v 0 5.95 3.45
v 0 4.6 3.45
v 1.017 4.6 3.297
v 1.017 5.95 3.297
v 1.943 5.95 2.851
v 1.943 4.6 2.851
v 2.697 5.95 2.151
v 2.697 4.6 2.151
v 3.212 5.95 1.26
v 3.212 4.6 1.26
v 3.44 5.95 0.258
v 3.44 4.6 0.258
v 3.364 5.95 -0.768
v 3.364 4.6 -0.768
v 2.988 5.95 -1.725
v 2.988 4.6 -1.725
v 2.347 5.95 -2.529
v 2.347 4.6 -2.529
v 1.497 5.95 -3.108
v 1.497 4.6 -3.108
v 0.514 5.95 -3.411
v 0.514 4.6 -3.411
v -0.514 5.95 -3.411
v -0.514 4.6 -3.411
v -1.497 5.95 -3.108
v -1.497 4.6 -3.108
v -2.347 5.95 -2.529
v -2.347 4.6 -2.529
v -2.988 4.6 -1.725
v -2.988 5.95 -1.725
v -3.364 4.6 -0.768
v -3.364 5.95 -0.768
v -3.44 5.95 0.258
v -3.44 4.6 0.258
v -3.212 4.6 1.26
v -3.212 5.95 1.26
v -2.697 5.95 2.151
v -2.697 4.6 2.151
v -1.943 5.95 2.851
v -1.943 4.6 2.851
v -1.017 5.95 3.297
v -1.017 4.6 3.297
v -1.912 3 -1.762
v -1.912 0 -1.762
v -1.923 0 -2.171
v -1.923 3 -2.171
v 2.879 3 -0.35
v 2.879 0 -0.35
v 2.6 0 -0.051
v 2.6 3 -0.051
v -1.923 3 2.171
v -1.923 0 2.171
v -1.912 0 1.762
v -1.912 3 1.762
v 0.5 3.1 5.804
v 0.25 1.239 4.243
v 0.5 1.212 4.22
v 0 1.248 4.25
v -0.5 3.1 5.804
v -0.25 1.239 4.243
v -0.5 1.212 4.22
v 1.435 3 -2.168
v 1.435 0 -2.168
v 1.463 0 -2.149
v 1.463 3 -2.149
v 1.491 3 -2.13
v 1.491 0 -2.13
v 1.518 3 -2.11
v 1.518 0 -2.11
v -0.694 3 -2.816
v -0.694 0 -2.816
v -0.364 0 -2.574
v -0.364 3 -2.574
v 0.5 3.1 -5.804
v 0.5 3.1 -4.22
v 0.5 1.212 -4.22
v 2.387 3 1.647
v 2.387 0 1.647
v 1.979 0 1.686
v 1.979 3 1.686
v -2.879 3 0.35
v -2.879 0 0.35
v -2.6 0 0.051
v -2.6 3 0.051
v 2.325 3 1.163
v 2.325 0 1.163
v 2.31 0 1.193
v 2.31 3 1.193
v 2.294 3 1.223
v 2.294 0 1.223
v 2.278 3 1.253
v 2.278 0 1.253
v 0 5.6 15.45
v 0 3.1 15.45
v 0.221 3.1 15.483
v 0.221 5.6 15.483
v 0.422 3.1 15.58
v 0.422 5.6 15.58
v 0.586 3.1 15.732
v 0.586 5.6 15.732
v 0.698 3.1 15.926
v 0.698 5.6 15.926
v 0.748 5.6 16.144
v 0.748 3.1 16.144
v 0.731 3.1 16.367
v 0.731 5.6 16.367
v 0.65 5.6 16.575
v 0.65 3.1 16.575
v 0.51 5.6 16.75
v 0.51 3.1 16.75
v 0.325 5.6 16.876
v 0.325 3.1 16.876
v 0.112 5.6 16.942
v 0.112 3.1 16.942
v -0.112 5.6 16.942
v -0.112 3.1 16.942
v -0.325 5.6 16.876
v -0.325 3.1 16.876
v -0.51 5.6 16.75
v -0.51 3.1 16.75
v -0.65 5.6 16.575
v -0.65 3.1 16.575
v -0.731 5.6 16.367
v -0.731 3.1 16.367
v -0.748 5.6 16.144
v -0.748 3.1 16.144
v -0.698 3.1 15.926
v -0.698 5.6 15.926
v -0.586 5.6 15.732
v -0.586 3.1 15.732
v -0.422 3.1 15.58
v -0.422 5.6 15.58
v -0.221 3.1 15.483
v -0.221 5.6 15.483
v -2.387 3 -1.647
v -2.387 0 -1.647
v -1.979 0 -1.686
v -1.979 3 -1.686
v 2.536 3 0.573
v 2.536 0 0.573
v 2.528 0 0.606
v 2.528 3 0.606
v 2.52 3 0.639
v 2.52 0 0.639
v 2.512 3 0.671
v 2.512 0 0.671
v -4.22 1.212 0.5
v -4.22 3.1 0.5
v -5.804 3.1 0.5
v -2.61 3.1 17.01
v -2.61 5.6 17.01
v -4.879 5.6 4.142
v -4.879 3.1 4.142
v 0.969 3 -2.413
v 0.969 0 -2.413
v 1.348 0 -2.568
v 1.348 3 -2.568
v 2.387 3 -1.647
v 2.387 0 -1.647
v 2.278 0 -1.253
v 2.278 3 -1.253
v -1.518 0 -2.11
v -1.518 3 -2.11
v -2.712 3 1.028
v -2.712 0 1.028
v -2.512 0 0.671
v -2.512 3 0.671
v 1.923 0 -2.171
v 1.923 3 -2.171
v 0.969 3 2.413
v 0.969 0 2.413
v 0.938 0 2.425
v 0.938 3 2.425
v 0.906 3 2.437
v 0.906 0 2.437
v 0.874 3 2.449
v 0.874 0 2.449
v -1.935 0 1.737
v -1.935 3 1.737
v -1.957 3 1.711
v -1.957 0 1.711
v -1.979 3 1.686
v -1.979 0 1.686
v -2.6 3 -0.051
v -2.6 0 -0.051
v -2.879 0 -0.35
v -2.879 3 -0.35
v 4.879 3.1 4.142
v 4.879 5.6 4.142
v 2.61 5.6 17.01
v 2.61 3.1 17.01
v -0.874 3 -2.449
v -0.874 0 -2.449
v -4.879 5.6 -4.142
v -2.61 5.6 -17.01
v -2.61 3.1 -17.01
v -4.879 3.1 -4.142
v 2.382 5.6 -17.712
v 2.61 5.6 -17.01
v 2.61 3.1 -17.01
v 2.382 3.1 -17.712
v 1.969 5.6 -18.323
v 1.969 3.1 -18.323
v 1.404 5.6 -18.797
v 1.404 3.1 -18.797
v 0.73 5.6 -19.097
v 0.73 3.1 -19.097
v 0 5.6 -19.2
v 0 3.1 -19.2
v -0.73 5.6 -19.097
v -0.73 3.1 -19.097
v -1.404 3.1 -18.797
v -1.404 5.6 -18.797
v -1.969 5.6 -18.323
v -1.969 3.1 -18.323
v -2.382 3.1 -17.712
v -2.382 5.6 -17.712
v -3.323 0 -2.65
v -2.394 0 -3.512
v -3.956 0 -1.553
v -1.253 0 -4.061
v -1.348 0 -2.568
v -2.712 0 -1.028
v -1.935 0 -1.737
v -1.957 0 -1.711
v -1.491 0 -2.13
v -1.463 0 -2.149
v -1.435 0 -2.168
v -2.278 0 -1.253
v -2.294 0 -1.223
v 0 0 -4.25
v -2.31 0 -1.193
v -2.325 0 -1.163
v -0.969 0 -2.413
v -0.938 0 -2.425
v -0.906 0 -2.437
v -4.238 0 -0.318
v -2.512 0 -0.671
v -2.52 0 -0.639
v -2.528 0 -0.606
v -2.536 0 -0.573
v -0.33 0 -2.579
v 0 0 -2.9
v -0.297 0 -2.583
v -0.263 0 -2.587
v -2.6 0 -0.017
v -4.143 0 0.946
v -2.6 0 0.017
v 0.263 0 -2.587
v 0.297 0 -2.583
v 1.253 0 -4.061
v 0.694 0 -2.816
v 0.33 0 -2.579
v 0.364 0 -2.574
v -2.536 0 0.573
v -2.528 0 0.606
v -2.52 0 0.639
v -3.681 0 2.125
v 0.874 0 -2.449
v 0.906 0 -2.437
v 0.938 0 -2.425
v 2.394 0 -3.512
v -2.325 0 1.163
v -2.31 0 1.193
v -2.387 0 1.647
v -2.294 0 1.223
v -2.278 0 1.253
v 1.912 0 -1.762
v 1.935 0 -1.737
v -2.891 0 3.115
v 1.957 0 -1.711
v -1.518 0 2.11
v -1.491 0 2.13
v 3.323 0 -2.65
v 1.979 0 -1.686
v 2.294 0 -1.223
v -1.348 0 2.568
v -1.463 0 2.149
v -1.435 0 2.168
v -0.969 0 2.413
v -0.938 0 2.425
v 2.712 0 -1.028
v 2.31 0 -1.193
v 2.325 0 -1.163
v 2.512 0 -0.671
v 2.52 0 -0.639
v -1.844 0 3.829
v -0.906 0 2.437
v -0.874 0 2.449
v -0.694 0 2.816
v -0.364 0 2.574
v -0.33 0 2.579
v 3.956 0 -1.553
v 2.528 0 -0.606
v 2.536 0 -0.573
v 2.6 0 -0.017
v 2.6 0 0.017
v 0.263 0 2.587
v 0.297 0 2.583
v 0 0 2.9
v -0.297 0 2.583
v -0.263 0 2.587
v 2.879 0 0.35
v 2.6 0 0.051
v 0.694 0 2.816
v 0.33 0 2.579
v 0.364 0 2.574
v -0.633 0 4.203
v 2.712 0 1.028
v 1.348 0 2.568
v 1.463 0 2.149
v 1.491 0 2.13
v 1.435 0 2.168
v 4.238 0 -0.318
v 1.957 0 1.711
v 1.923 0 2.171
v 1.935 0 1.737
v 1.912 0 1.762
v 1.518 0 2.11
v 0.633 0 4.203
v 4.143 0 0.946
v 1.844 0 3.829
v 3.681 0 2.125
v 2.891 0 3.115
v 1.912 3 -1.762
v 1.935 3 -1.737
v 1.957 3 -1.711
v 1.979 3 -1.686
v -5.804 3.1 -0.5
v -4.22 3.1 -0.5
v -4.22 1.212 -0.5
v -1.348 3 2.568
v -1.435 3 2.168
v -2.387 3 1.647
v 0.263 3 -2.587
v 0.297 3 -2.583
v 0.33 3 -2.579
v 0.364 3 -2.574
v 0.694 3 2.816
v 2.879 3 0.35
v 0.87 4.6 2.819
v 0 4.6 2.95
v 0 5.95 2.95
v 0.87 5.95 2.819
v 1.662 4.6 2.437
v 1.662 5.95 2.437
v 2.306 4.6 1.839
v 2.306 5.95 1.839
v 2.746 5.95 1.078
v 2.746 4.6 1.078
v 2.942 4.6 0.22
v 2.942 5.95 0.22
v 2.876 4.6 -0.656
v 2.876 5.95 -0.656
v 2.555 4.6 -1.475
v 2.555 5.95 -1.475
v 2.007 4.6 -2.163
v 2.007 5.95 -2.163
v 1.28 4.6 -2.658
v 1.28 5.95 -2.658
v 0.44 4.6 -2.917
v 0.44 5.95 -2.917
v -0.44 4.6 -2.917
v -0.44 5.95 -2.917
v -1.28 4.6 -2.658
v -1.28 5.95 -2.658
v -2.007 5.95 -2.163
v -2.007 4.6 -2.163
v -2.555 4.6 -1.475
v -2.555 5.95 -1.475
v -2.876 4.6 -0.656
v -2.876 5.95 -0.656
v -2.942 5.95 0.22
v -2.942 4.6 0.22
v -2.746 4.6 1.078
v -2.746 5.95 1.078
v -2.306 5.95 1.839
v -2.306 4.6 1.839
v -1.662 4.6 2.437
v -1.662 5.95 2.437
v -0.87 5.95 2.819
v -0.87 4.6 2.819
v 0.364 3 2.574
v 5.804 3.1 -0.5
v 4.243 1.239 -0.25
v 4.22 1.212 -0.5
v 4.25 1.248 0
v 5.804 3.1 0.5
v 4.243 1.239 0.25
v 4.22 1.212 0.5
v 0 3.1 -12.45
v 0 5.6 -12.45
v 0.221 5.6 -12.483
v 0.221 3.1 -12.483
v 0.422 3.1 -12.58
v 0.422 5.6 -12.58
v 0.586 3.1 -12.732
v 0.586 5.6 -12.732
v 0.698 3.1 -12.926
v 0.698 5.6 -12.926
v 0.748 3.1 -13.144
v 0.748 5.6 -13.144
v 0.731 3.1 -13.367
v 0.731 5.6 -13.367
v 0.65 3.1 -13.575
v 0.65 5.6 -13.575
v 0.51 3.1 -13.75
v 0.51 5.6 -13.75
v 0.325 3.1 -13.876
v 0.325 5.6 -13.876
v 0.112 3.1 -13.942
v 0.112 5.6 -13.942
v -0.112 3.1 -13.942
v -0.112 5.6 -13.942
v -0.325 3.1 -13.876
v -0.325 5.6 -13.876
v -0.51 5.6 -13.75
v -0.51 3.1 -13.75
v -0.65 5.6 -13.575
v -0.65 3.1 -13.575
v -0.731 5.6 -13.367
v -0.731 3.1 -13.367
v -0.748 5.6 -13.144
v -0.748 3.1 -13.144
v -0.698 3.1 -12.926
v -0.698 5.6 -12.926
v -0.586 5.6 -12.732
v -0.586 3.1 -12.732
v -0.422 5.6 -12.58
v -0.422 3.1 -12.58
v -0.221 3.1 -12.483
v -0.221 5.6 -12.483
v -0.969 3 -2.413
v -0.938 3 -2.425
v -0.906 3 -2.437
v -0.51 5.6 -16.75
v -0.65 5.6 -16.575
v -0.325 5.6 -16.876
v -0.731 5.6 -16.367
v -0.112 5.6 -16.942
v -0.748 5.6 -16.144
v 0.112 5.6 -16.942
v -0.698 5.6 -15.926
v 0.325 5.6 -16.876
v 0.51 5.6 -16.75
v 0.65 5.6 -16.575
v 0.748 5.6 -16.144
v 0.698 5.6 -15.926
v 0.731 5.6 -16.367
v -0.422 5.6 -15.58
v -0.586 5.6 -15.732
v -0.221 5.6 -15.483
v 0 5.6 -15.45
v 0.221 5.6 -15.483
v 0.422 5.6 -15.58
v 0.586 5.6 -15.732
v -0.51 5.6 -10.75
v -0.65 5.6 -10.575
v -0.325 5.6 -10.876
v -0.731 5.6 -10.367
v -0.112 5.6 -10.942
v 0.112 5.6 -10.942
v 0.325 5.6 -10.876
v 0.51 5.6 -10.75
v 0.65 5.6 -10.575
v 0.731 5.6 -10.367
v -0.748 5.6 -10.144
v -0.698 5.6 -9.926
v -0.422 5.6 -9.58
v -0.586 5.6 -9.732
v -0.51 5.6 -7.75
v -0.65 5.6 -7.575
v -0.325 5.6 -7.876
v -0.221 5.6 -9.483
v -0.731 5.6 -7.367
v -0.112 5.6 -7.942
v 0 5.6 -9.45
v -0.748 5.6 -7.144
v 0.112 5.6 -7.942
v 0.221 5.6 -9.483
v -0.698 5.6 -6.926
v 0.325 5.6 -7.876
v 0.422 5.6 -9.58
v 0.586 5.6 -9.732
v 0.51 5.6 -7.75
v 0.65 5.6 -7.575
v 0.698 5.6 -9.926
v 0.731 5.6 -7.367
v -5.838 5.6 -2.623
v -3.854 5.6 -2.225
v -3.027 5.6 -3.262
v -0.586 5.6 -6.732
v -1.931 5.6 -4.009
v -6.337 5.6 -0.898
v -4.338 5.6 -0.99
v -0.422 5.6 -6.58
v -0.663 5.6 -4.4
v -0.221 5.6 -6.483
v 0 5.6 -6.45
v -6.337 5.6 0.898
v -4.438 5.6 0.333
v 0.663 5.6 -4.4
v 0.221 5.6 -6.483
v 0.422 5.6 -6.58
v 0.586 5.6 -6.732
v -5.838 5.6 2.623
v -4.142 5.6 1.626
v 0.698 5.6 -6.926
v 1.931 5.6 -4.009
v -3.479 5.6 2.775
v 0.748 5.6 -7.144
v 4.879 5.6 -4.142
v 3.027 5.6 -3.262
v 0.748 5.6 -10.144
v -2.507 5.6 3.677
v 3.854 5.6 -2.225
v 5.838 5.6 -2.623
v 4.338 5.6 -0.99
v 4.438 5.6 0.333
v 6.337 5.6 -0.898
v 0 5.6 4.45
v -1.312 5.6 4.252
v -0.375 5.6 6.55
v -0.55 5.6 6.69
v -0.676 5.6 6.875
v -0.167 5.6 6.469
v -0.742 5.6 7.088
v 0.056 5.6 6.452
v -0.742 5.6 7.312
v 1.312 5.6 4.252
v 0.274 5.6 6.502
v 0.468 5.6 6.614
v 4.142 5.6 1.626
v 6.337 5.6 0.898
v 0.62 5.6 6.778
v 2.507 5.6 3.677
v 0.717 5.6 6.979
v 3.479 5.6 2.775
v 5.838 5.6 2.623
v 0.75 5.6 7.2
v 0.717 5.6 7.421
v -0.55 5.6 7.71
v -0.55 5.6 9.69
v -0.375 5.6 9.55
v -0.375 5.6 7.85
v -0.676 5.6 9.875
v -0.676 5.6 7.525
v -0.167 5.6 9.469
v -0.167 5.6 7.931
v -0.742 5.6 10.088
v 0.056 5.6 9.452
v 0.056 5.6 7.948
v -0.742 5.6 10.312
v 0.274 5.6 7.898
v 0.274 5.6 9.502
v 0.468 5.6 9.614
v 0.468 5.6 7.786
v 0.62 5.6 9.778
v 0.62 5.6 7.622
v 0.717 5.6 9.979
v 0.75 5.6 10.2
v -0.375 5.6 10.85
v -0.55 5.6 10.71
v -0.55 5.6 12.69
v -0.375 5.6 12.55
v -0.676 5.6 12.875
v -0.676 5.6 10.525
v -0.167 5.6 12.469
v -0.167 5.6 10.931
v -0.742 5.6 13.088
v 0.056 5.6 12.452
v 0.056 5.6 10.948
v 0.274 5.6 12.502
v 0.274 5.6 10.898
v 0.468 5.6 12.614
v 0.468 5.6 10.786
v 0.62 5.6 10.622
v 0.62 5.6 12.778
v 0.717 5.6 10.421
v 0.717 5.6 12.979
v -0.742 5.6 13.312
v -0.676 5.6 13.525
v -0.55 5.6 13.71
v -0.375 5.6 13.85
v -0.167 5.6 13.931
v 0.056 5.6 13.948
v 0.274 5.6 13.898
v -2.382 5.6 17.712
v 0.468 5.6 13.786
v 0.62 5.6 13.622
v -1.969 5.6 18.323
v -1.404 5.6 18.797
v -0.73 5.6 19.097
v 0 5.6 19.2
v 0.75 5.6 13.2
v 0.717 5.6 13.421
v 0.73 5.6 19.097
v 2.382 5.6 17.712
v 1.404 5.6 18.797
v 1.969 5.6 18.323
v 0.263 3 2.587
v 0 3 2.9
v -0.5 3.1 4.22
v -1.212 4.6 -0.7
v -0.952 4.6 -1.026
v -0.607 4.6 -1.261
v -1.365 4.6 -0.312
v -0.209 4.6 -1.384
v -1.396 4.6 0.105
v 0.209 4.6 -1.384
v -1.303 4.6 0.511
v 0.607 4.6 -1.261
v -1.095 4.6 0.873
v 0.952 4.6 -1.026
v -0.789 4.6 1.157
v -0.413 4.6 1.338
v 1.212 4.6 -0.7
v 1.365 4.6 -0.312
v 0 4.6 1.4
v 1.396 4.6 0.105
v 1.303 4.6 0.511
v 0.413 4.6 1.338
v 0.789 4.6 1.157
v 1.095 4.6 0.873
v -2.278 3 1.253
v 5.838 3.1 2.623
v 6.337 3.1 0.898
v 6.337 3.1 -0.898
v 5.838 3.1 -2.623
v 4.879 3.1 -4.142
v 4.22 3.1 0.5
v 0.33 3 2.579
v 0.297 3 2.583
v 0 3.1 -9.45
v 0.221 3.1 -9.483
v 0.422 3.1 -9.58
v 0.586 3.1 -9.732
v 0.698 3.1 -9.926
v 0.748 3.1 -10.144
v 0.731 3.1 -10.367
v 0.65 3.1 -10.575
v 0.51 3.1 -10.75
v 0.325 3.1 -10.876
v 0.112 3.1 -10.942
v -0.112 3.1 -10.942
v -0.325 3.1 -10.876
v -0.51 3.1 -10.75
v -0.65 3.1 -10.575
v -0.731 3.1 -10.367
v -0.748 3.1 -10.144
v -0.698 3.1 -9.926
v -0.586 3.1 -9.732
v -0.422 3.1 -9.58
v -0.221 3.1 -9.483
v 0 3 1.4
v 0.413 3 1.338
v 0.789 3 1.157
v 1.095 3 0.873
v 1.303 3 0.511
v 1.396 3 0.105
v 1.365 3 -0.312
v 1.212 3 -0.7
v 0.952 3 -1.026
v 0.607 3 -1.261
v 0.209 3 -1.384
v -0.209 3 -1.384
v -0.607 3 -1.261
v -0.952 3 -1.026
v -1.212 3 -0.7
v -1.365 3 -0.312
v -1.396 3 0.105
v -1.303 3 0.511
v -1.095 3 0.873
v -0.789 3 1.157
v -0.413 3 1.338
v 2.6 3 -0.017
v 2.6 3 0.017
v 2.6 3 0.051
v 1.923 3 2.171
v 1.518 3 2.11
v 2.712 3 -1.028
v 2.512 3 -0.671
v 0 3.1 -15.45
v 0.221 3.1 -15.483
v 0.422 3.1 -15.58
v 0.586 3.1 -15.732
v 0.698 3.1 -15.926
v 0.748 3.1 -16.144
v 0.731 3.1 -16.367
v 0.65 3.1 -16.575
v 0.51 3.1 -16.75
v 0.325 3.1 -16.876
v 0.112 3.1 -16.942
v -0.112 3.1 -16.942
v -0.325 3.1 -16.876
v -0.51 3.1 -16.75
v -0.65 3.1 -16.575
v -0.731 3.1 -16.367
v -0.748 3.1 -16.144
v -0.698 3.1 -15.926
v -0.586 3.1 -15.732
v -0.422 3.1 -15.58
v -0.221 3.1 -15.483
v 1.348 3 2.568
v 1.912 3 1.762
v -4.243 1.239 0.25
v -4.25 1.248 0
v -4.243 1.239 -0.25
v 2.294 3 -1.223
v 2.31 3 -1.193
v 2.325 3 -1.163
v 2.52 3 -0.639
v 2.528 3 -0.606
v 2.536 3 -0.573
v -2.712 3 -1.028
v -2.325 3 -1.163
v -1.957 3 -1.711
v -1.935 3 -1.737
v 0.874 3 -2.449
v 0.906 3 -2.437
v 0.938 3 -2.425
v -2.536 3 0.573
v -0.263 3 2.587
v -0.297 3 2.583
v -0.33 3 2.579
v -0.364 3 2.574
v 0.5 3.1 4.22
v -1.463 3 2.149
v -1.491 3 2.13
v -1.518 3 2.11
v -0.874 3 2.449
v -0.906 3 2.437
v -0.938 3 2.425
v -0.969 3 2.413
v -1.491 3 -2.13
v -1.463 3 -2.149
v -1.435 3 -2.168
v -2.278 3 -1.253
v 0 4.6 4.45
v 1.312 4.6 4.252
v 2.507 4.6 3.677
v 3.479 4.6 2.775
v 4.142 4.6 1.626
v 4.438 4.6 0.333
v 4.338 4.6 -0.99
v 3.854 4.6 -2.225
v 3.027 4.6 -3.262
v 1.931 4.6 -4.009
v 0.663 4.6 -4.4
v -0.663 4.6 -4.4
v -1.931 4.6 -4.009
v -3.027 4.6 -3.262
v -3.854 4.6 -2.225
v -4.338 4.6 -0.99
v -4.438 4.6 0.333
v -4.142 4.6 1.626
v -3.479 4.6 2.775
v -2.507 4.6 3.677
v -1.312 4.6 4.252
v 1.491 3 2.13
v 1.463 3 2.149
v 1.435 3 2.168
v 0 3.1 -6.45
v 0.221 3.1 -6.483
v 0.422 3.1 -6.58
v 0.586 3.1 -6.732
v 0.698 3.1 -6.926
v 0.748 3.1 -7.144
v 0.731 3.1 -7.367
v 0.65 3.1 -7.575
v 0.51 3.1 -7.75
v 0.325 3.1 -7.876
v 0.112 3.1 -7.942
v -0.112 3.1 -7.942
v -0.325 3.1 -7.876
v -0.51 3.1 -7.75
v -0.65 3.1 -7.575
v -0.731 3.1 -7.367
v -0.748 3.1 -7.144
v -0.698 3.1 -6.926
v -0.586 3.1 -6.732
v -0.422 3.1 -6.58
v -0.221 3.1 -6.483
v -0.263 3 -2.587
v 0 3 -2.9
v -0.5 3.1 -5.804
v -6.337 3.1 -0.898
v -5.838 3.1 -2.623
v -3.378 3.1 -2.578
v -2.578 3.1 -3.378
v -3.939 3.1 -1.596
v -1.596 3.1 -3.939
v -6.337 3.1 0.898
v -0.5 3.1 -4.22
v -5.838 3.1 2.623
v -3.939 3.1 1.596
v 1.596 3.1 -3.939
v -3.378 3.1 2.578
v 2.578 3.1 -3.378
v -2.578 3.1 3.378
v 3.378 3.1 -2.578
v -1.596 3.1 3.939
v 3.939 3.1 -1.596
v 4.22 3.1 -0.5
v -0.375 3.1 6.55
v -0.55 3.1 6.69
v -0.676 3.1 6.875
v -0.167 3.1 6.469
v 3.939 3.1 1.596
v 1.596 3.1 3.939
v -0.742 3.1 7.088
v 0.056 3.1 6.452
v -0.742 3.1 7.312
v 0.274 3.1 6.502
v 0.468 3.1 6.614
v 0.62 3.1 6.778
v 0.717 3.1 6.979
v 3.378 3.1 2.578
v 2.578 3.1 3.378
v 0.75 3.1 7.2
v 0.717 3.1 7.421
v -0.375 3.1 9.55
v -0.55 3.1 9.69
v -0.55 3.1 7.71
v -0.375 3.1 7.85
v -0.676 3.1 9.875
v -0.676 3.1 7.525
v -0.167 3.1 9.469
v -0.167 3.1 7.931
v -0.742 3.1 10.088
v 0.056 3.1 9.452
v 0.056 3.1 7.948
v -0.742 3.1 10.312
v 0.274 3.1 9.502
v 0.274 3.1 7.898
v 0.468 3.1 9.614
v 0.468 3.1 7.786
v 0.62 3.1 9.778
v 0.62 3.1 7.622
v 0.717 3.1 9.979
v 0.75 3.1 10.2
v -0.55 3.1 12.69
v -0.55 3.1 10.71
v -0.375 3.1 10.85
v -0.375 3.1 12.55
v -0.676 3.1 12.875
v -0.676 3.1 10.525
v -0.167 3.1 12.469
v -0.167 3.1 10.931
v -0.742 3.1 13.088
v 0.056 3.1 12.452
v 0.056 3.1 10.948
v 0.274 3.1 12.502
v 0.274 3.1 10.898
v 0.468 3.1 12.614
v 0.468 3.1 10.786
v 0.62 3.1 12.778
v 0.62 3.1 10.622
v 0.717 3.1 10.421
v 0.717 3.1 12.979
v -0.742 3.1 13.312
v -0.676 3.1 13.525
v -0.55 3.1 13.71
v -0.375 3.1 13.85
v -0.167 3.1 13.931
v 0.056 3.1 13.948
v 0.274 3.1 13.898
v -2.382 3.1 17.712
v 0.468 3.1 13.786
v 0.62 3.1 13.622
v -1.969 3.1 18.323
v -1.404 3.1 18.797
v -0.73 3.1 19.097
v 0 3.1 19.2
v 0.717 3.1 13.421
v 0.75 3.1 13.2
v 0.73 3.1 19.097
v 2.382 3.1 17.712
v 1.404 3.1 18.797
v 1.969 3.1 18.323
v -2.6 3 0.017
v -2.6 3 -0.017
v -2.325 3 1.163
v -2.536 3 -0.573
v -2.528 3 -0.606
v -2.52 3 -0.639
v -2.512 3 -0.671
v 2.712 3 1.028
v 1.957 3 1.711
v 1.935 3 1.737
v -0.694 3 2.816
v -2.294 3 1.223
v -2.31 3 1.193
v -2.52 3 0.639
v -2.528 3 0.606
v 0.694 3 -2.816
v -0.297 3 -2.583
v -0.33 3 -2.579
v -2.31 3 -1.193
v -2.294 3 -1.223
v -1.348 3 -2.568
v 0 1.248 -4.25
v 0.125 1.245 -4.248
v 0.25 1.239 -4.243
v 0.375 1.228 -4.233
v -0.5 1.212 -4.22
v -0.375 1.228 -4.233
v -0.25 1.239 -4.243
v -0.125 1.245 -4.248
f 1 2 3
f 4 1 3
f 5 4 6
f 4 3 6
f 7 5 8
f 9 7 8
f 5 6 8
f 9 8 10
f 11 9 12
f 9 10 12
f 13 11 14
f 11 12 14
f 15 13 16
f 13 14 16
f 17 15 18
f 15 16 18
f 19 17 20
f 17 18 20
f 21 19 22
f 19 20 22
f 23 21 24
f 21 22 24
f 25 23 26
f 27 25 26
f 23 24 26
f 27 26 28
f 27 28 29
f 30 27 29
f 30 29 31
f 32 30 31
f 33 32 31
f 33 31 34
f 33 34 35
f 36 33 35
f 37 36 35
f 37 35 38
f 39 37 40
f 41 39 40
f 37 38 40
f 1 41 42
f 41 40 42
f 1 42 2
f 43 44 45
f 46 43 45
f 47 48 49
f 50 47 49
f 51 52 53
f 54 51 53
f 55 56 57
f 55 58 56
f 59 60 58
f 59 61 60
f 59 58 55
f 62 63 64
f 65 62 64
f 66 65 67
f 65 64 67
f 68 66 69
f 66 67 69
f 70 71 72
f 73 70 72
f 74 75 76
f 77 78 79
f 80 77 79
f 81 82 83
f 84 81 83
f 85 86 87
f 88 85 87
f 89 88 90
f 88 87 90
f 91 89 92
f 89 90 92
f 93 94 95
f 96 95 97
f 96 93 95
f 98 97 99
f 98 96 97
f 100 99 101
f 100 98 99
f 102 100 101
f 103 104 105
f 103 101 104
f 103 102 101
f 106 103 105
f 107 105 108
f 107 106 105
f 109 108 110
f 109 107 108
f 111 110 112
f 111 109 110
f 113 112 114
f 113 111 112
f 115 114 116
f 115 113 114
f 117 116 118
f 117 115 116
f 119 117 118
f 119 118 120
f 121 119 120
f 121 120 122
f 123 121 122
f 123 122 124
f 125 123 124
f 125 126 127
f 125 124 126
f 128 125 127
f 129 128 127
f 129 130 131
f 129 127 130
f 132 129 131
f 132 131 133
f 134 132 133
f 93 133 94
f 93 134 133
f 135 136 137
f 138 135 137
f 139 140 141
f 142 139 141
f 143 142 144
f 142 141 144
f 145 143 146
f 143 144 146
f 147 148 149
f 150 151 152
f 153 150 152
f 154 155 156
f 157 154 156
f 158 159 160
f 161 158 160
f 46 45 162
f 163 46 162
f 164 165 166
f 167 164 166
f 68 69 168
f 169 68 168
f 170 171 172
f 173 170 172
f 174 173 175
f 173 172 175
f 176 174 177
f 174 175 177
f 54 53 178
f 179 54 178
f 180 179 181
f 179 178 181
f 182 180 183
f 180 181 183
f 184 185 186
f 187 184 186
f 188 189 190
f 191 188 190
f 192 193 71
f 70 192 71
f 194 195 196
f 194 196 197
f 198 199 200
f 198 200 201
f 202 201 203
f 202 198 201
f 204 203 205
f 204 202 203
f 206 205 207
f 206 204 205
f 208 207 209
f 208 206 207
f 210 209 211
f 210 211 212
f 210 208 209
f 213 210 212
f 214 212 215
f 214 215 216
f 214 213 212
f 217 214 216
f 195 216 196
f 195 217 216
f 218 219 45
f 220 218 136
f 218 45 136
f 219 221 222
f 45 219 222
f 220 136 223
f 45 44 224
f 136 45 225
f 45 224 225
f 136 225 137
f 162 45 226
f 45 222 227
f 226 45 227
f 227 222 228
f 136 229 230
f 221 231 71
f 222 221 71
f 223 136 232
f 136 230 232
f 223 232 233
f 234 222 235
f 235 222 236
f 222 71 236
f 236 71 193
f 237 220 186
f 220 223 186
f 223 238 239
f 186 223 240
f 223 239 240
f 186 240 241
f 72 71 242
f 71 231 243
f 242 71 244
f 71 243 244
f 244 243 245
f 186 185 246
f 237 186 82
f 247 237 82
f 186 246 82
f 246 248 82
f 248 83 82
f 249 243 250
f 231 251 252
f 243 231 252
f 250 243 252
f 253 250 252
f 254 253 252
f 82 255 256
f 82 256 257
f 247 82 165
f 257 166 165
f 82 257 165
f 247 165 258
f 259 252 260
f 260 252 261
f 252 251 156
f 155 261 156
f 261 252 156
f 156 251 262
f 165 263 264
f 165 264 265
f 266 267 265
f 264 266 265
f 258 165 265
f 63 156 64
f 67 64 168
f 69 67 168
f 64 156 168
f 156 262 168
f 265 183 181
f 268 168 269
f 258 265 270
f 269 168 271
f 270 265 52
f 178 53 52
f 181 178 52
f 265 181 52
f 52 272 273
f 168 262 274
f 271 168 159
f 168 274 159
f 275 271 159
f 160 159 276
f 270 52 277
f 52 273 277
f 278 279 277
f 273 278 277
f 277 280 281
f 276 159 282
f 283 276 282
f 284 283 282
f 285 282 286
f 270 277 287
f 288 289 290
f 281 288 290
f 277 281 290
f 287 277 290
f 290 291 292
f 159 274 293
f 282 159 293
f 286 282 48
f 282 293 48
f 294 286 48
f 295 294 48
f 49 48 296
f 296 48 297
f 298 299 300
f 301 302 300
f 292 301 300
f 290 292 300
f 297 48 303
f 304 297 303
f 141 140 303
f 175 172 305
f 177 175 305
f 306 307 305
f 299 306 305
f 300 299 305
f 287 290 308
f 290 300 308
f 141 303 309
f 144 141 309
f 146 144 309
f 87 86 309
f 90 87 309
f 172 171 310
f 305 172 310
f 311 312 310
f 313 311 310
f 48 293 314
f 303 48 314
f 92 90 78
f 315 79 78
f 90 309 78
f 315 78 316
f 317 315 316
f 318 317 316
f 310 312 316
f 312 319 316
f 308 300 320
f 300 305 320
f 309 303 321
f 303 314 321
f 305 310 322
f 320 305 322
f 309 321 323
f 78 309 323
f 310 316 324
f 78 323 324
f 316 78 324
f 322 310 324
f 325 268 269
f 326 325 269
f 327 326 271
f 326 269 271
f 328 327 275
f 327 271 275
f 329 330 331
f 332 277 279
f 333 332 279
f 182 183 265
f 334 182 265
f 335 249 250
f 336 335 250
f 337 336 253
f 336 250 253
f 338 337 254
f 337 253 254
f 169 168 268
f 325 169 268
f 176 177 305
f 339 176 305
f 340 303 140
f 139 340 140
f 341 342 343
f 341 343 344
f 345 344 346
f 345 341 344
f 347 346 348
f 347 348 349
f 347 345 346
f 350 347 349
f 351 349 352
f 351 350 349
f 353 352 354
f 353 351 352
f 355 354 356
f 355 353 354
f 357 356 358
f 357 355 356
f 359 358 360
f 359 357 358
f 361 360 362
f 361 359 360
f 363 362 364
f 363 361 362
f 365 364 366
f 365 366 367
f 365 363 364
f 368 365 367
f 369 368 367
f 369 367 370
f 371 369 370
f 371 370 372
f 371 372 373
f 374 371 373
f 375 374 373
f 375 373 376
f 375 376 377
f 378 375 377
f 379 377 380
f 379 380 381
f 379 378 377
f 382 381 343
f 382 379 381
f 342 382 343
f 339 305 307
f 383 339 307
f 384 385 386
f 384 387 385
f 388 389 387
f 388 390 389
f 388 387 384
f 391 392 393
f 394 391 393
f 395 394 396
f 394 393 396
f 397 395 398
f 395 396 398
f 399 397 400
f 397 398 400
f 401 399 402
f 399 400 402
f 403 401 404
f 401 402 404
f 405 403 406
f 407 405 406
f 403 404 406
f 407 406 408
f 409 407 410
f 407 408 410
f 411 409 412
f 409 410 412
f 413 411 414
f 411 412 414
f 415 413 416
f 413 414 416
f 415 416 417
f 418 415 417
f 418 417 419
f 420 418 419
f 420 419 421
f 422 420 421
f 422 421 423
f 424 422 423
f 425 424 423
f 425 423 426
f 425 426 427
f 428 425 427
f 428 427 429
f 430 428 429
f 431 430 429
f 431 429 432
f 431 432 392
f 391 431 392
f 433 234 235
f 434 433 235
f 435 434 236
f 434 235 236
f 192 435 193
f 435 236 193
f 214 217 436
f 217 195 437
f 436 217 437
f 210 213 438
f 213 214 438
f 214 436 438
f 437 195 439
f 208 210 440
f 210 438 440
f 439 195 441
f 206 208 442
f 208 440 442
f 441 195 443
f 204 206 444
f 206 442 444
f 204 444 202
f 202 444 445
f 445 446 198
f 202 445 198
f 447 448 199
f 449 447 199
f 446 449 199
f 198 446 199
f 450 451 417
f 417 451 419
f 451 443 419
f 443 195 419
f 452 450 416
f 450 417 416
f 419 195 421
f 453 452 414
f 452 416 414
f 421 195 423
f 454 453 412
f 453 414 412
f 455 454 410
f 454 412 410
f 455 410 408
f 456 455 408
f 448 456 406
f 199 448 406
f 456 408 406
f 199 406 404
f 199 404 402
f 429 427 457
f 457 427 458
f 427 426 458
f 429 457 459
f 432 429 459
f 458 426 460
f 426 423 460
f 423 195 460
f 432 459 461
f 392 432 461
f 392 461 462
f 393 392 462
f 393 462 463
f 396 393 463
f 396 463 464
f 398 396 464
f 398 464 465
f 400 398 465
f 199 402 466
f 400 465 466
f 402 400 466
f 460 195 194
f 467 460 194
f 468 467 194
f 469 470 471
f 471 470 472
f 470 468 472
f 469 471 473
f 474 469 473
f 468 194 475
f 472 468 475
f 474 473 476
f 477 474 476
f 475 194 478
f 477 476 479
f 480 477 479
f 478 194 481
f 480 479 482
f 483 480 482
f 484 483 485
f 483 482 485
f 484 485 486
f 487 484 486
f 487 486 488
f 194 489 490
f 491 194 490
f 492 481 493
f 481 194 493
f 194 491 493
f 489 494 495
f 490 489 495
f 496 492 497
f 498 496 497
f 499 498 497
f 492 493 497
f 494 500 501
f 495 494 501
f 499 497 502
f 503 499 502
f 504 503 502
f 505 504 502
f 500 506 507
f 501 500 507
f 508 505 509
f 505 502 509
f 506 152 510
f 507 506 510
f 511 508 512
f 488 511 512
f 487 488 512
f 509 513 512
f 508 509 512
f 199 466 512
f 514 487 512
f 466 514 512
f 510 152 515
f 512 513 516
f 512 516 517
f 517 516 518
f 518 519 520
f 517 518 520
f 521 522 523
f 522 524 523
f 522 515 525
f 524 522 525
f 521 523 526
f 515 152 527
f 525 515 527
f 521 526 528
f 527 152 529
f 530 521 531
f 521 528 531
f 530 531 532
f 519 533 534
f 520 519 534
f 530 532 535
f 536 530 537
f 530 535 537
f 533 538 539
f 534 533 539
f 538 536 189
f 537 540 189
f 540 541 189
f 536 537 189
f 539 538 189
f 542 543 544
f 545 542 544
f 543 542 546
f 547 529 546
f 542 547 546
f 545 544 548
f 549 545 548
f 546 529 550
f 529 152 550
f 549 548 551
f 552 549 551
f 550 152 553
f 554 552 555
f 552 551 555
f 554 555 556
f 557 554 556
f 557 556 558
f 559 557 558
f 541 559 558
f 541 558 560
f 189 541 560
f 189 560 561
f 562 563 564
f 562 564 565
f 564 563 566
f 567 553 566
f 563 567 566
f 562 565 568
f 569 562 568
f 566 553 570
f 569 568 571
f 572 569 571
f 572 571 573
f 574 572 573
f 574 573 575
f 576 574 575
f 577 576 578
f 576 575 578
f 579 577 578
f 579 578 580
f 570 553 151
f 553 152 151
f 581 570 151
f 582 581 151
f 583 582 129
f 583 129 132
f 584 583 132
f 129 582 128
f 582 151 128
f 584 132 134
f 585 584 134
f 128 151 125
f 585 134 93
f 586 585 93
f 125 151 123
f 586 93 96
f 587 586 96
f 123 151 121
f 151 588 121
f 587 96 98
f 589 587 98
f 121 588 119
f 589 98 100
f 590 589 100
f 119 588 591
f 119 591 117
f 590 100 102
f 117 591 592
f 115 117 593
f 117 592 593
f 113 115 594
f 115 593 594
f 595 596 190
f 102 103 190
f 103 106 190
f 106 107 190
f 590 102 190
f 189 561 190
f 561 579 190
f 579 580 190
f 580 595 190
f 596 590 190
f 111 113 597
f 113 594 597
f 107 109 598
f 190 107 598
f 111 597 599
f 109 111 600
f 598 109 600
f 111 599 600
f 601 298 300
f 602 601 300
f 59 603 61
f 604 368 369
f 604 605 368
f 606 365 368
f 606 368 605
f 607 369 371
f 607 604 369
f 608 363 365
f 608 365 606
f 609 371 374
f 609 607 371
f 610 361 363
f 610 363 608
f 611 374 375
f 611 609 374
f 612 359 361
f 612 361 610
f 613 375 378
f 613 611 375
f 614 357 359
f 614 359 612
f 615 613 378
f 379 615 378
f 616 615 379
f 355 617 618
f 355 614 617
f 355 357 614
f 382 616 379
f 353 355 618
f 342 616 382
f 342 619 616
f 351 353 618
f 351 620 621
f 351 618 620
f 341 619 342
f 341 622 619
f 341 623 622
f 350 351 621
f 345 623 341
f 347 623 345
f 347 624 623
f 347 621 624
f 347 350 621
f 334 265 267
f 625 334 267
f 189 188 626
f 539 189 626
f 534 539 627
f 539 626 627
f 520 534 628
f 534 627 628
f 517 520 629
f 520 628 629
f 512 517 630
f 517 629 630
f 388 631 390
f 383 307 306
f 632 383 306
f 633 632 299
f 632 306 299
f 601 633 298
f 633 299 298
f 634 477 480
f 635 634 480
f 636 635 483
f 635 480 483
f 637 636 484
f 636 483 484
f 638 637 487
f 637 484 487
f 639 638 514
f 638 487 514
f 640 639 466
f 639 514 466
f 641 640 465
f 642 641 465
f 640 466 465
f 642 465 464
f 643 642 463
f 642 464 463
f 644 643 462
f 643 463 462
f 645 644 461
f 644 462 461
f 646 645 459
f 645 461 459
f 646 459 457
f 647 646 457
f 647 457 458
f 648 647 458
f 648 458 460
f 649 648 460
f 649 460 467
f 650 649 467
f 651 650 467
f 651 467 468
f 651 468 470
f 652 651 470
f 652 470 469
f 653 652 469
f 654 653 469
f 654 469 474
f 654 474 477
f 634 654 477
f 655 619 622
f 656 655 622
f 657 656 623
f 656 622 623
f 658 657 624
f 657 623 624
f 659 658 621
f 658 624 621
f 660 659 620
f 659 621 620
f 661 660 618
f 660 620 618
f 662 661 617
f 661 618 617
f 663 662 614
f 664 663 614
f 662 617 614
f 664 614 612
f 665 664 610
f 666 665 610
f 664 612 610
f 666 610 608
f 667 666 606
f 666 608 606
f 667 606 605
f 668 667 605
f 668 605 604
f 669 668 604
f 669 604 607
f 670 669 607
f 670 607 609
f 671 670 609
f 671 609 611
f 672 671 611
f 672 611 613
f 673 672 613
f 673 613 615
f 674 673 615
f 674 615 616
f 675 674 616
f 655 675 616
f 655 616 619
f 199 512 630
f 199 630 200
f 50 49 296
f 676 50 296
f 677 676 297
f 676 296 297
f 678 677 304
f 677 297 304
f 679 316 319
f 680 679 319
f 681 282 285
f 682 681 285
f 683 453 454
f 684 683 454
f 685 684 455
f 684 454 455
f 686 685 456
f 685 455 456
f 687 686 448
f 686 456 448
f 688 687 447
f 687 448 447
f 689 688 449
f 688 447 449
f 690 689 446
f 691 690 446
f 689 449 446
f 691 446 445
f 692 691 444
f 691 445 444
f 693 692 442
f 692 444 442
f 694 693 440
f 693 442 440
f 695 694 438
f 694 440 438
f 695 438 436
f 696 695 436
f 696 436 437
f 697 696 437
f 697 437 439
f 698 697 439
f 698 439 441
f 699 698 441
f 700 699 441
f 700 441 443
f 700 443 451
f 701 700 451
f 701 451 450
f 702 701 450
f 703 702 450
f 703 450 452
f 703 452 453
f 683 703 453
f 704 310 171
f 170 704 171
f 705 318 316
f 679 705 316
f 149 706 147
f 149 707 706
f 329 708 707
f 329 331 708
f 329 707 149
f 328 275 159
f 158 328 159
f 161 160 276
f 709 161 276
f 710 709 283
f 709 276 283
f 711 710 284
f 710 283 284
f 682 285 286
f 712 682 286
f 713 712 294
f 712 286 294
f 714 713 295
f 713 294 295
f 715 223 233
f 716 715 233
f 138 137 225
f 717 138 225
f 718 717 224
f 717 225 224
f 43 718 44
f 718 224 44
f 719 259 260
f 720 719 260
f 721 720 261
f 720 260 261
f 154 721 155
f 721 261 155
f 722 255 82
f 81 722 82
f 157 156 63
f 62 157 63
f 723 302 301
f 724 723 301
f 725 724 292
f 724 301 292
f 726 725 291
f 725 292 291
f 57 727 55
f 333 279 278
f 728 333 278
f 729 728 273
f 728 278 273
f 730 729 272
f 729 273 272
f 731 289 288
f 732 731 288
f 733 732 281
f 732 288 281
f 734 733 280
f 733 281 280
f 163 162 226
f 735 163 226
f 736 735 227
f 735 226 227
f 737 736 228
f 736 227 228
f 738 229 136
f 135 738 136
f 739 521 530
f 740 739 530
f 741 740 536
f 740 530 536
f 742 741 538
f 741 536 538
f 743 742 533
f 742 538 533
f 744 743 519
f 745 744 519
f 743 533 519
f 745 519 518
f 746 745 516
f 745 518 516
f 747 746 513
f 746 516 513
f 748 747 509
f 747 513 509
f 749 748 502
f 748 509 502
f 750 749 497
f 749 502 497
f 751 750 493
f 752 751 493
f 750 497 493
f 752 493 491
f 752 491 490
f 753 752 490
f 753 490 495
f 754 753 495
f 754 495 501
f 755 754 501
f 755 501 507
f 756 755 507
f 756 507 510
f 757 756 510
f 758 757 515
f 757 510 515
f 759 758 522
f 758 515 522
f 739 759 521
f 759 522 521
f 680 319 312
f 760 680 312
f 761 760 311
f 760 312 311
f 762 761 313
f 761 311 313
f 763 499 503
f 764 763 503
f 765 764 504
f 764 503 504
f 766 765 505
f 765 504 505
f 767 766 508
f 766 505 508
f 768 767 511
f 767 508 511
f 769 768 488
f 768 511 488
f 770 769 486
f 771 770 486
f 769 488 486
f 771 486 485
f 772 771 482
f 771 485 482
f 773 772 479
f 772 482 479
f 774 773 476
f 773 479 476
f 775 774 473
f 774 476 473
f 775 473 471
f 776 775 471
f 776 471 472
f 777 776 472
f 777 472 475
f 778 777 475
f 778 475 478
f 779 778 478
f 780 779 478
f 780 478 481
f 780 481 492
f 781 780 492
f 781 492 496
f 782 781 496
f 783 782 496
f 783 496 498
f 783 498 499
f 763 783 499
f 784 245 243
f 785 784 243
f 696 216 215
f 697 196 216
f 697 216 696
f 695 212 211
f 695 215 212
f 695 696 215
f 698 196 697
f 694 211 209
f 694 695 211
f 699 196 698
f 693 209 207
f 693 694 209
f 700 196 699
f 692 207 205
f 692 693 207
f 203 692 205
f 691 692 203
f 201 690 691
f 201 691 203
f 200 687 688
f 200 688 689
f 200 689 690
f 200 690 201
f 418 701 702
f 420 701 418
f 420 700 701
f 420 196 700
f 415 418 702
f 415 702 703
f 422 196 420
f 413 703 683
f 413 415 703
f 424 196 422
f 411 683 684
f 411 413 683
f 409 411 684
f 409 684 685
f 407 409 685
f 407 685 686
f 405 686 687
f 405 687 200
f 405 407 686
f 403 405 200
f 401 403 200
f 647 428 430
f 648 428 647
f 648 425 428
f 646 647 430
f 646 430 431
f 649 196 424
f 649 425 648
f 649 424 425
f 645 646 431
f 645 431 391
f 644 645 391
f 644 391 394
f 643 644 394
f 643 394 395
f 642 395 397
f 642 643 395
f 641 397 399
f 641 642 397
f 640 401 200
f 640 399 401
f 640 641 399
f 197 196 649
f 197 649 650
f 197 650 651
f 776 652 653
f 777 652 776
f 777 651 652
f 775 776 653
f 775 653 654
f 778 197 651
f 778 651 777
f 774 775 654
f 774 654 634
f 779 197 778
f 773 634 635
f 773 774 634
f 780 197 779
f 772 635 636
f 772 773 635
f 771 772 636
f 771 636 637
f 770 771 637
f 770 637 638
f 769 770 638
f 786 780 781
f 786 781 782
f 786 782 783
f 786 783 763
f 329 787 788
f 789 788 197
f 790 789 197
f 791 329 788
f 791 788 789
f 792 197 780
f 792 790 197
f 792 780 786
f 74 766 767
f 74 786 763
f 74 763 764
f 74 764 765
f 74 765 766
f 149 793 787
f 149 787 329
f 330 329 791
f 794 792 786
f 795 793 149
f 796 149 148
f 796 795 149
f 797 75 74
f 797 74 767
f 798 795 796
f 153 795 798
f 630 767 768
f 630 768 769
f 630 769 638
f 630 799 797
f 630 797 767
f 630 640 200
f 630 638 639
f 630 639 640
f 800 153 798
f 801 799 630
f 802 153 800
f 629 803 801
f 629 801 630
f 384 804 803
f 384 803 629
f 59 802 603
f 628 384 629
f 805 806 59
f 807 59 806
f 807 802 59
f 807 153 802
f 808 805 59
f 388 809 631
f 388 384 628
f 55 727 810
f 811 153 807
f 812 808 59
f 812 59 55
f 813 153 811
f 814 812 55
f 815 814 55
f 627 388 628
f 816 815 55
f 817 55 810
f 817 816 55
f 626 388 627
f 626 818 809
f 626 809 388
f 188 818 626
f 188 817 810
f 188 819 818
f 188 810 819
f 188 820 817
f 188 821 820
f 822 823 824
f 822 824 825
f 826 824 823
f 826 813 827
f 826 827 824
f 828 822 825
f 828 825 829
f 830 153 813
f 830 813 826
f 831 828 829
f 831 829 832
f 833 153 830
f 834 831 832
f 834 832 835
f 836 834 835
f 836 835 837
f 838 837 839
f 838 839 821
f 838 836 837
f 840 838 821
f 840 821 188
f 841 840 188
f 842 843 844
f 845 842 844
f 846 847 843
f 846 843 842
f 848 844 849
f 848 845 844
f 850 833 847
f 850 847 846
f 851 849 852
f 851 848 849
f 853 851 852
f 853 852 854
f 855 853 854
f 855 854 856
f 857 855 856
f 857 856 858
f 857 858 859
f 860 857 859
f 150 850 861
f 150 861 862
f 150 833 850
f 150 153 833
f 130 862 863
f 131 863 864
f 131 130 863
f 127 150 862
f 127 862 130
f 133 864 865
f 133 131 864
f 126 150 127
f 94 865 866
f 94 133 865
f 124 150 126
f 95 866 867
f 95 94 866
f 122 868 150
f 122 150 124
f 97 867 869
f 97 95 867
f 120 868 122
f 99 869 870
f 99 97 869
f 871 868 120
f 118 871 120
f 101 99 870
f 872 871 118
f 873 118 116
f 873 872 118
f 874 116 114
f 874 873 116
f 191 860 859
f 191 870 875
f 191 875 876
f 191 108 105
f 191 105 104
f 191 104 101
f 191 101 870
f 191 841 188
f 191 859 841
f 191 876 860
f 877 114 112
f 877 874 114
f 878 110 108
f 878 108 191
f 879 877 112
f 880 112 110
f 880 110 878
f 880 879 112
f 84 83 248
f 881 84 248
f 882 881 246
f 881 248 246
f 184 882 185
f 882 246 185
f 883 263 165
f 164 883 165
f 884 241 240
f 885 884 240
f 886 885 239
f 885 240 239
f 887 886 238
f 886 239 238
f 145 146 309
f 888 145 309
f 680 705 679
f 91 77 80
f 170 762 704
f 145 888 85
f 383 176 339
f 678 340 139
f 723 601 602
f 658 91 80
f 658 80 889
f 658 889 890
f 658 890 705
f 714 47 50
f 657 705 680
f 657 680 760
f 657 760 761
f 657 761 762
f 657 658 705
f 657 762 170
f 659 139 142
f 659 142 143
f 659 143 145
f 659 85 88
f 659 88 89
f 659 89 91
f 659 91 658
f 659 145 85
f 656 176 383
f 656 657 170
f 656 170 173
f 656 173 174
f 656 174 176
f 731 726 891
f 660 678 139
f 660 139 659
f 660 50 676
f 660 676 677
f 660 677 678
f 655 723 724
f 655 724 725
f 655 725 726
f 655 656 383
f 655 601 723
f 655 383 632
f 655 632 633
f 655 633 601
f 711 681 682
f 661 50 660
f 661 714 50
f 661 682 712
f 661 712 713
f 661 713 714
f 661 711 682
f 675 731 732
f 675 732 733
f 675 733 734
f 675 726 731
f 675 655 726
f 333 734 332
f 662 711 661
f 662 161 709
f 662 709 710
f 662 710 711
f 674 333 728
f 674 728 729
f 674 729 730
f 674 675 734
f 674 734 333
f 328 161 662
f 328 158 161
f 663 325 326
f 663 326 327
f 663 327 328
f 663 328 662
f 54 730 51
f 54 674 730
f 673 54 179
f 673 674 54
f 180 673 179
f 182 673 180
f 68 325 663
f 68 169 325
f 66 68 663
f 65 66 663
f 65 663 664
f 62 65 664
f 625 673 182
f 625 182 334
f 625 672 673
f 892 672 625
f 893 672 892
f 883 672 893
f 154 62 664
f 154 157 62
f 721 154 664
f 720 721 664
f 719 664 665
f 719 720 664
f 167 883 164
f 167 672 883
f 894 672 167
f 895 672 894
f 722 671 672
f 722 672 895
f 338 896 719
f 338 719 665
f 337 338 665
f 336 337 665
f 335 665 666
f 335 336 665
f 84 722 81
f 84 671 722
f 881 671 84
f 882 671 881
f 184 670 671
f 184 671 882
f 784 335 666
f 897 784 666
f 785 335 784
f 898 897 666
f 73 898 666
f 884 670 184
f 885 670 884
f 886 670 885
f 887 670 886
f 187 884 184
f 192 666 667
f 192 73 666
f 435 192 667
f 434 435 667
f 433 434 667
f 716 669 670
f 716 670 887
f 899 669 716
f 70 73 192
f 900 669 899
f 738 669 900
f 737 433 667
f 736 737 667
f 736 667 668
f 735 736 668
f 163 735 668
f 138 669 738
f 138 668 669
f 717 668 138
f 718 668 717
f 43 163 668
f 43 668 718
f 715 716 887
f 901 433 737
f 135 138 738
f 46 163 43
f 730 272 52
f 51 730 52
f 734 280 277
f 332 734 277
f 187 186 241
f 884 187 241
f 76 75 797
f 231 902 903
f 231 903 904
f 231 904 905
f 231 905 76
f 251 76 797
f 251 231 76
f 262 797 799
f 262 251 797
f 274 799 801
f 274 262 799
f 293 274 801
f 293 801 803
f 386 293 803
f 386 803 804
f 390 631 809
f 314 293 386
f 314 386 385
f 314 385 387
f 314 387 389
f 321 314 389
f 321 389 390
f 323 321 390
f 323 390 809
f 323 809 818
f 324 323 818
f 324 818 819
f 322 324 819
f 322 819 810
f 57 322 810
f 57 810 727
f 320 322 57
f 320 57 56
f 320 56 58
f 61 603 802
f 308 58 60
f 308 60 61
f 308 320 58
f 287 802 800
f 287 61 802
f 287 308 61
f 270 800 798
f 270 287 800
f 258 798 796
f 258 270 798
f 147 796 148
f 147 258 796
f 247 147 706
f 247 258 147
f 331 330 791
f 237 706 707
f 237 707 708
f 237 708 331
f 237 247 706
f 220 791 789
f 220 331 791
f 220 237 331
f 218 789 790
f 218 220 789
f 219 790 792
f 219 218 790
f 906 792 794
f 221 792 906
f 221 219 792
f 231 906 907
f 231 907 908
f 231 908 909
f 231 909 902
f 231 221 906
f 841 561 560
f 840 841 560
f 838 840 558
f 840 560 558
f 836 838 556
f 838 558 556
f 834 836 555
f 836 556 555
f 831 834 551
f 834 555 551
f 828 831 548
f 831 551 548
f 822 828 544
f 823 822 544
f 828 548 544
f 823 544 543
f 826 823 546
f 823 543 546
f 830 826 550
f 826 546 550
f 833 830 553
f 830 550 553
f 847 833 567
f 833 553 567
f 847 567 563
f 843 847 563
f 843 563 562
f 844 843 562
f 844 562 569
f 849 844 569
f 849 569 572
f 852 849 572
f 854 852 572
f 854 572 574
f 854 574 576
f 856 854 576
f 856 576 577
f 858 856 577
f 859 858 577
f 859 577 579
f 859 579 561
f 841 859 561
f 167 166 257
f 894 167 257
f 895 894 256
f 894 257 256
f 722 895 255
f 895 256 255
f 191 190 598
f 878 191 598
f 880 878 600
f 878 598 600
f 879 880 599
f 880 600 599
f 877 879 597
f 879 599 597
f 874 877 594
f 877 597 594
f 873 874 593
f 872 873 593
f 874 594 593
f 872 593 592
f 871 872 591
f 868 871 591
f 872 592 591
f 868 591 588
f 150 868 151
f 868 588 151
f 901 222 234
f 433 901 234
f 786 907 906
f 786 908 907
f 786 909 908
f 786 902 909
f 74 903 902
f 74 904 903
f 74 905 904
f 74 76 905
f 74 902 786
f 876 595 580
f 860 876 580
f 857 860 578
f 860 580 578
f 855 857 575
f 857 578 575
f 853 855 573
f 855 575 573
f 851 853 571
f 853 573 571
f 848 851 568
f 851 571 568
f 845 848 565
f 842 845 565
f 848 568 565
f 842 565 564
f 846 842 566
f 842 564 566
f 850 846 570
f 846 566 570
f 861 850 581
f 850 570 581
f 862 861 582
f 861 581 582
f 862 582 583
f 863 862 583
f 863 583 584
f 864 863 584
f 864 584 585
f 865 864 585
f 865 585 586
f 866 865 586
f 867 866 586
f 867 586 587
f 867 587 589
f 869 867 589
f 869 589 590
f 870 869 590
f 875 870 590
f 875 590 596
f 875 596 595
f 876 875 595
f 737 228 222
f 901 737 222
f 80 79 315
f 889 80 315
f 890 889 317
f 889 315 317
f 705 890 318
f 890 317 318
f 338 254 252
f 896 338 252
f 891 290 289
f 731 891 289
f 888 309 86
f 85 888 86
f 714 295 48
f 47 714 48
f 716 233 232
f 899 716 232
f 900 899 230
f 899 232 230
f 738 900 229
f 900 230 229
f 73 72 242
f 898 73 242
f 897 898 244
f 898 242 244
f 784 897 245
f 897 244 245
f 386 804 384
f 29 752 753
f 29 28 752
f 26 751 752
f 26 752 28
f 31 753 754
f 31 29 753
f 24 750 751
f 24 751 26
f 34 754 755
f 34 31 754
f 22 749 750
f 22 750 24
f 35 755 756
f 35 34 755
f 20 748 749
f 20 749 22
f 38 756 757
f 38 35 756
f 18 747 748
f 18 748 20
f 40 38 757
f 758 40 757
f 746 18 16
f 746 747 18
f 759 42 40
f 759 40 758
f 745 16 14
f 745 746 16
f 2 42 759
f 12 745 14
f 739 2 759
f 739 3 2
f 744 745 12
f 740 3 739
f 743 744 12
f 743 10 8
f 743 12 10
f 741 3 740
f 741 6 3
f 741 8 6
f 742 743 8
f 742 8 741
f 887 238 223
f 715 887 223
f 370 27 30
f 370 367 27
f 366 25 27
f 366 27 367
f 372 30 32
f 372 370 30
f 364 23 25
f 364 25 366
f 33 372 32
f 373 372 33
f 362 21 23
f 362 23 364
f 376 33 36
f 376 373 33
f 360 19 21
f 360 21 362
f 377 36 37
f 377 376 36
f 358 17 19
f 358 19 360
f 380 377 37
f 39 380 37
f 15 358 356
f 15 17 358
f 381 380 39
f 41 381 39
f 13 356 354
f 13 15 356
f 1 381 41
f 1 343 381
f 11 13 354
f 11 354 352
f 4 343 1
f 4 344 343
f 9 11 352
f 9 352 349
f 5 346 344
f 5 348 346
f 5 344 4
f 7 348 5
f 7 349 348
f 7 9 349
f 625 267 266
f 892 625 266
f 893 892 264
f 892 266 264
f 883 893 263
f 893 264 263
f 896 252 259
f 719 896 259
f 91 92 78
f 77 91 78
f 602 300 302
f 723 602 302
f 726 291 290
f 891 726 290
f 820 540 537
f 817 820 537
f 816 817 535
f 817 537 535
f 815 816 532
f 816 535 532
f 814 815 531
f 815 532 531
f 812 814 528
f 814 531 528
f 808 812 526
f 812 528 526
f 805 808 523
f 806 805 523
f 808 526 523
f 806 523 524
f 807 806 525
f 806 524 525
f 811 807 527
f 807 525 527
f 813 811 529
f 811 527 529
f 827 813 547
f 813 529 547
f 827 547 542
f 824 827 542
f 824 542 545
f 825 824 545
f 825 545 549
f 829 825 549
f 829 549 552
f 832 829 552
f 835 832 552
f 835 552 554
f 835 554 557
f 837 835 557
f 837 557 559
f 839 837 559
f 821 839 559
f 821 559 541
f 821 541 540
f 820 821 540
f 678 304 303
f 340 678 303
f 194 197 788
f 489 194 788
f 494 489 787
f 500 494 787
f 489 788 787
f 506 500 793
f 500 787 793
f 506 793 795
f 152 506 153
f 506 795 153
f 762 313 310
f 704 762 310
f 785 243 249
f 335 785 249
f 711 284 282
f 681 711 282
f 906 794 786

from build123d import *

# Parameters (mm, degrees)
BASES_R                     = 6.4
BASE_DEPTH                  = 5.6
TOPBORES_R                  = 1.4
TOP_BORE_DEPTH              = 11.643307757
HORN_HALF_DEPTH             = 2.5
HORNATTACHS_R               = 0.75
HORN_ATTACH_DEPTH           = 21.999047597
HA_LP_COUNT                 = 4
HA_LP_PITCH                 = 3
HORN_BODIES_COPY_1_SKETCH_R = 0.75
HORN_BODIES_COPY_1_DEPTH    = 21.999047597
HORN_BODIES_COPY_2_SKETCH_R = 0.75
HORN_BODIES_COPY_2_DEPTH    = 21.999047597
HORN_BODIES_COPY_3_SKETCH_R = 0.75
HORN_BODIES_COPY_3_DEPTH    = 21.999047597
TOOTH_DEPTH                 = 3
TOOTH_CP_COUNT              = 26
BOTTOMBORES_R               = 2.6
BOTTOM_BORE_DEPTH           = 3
HOLDINGSHAFTS_R             = 6.4
HOLDINGSHAFTS_R_2           = 4.25
HOLDING_SHAFT_DEPTH         = 3.1
RIB_DEPTH                   = 0.5
RIB_CP_COUNT                = 4
TOPCUTS_R                   = 4.45
TOP_CUT_DEPTH               = 1
TOPPOCKETCYLINDERS_R        = 3.45
TOPPOCKETCYLINDERS_R_2      = 2.95
TOP_POCKET_CYLINDER_DEPTH   = 1.35


with BuildPart() as part:
    # BaseS → BASE (new body)
    with BuildSketch(Plane(origin=(0, 0, 0), x_dir=(1, 0, 0), z_dir=(0, 1, 0))):
        with Locations(Location((0, 0, 0), (0, 0, 270))):
            Circle(BASES_R)
    extrude(amount=BASE_DEPTH)

    # TopBoreS → TOP BORE (cut, through all)
    with BuildSketch(Plane(origin=(0, 5.6, 0), x_dir=(1, 0, 0), z_dir=(0, 1, 0))):
        with Locations(Location((0, 0, 0), (0, 0, 270))):
            Circle(TOPBORES_R)
    extrude(amount=-TOP_BORE_DEPTH, mode=Mode.SUBTRACT)

    # HornHalfS → HORN HALF (add)
    with BuildSketch(Plane(origin=(0, 5.6, 0), x_dir=(1, 0, 0), z_dir=(0, 1, 0))):
        with BuildLine():
            Line((-2.609740545, 17.010167671), (-4.878700663, 4.142255405))
            ThreePointArc((-4.878700663, 4.142255405), (0, 6.4), (4.878700663, 4.142255405))
            Line((4.878700663, 4.142255405), (2.609740545, 17.010167671))
            ThreePointArc((2.609740545, 17.010167671), (0, 19.2), (-2.609740545, 17.010167671))
        make_face()
    horn_half = extrude(amount=-HORN_HALF_DEPTH)

    # HornAttachS → HORN ATTACH (cut, through all)
    with BuildSketch(Plane(origin=(0, 5.6, 0), x_dir=(1, 0, 0), z_dir=(0, 1, 0))):
        with Locations(Location((0, 16.2, 0), (0, 0, 270))):
            Circle(HORNATTACHS_R)
    horn_attach = extrude(amount=-HORN_ATTACH_DEPTH, mode=Mode.SUBTRACT)

    # HA LP: HORN ATTACH ×4
    with Locations(*[(0, 0, i * HA_LP_PITCH) for i in range(1, HA_LP_COUNT)]):
        add(horn_attach, mode=Mode.SUBTRACT)

    # HORN BODIES: HORN HALF, HORN ATTACH across plane
    add(horn_half.mirror(Plane.XY))
    add(horn_attach.mirror(Plane.XY), mode=Mode.SUBTRACT)

    # HORN BODIES copy 1 sketch → HORN BODIES copy 1 (cut, through all)
    with BuildSketch(Plane(origin=(0, 5.6, -3), x_dir=(1, 0, 0), z_dir=(0, 1, 0))):
        with Locations((0, -16.2)):
            Circle(HORN_BODIES_COPY_1_SKETCH_R)
    extrude(amount=-HORN_BODIES_COPY_1_DEPTH, mode=Mode.SUBTRACT)

    # HORN BODIES copy 2 sketch → HORN BODIES copy 2 (cut, through all)
    with BuildSketch(Plane(origin=(0, 5.6, -6), x_dir=(1, 0, 0), z_dir=(0, 1, 0))):
        with Locations((0, -16.2)):
            Circle(HORN_BODIES_COPY_2_SKETCH_R)
    extrude(amount=-HORN_BODIES_COPY_2_DEPTH, mode=Mode.SUBTRACT)

    # HORN BODIES copy 3 sketch → HORN BODIES copy 3 (cut, through all)
    with BuildSketch(Plane(origin=(0, 5.6, -9), x_dir=(1, 0, 0), z_dir=(0, 1, 0))):
        with Locations((0, -16.2)):
            Circle(HORN_BODIES_COPY_3_SKETCH_R)
    extrude(amount=-HORN_BODIES_COPY_3_DEPTH, mode=Mode.SUBTRACT)

    # ToothS → TOOTH (cut)
    with BuildSketch(Plane.XZ):
        with BuildLine():
            Line((0, -2.9), (0.262912611, -2.586672952))
            ThreePointArc((0.262912611, -2.586672952), (0, -2.6), (-0.262912611, -2.586672952))
            Line((-0.262912611, -2.586672952), (0, -2.9))
        make_face()
    tooth = extrude(amount=-TOOTH_DEPTH, mode=Mode.SUBTRACT)

    # TOOTH CP: TOOTH ×26 about axis
    tooth_cp_axis = Axis((0, 0, 0), (0, 1, 0))
    for i in range(1, TOOTH_CP_COUNT):
        add(tooth.rotate(tooth_cp_axis, i * 360 / TOOTH_CP_COUNT), mode=Mode.SUBTRACT)

    # BottomBoreS → BOTTOM BORE (cut)
    with BuildSketch(Plane(origin=(0, 0, 0), x_dir=(-1, 0, 0), z_dir=(0, -1, 0))):
        Circle(BOTTOMBORES_R)
    extrude(amount=-BOTTOM_BORE_DEPTH, mode=Mode.SUBTRACT)

    # HoldingShaftS → HOLDING SHAFT (cut)
    with BuildSketch(Plane.XZ):
        Circle(HOLDINGSHAFTS_R)
        with Locations(Location((0, 0, 0), (0, 0, 270))):
            Circle(HOLDINGSHAFTS_R_2, mode=Mode.SUBTRACT)
    extrude(amount=-HOLDING_SHAFT_DEPTH, mode=Mode.SUBTRACT)

    # RibS → RIB (add, symmetric)
    with BuildSketch(Plane.XY):
        Polygon((4.21, 1.2), (5.804289299, 3.1), (4.21, 3.1), (4.16, 3.1), (4.16, 1.2), align=None)
    rib = extrude(amount=RIB_DEPTH, both=True)

    # RIB CP: RIB ×4 about axis
    rib_cp_axis = Axis((0, 0, 0), (0, 1, 0))
    for i in range(1, RIB_CP_COUNT):
        add(rib.rotate(rib_cp_axis, i * 360 / RIB_CP_COUNT))

    # TopCutS → TOP CUT (cut)
    with BuildSketch(Plane(origin=(0, 5.6, 0), x_dir=(1, 0, 0), z_dir=(0, 1, 0))):
        with Locations(Location((0, 0, 0), (0, 0, 270))):
            Circle(TOPCUTS_R)
    extrude(amount=-TOP_CUT_DEPTH, mode=Mode.SUBTRACT)

    # TopPocketCylinderS → TOP POCKET CYLINDER (add)
    with BuildSketch(Plane(origin=(0, 4.6, 0), x_dir=(1, 0, 0), z_dir=(0, 1, 0))):
        with Locations(Location((0, 0, 0), (0, 0, 270))):
            Circle(TOPPOCKETCYLINDERS_R)
        with Locations(Location((0, 0, 0), (0, 0, 270))):
            Circle(TOPPOCKETCYLINDERS_R_2, mode=Mode.SUBTRACT)
    extrude(amount=TOP_POCKET_CYLINDER_DEPTH)


solid = part.part
